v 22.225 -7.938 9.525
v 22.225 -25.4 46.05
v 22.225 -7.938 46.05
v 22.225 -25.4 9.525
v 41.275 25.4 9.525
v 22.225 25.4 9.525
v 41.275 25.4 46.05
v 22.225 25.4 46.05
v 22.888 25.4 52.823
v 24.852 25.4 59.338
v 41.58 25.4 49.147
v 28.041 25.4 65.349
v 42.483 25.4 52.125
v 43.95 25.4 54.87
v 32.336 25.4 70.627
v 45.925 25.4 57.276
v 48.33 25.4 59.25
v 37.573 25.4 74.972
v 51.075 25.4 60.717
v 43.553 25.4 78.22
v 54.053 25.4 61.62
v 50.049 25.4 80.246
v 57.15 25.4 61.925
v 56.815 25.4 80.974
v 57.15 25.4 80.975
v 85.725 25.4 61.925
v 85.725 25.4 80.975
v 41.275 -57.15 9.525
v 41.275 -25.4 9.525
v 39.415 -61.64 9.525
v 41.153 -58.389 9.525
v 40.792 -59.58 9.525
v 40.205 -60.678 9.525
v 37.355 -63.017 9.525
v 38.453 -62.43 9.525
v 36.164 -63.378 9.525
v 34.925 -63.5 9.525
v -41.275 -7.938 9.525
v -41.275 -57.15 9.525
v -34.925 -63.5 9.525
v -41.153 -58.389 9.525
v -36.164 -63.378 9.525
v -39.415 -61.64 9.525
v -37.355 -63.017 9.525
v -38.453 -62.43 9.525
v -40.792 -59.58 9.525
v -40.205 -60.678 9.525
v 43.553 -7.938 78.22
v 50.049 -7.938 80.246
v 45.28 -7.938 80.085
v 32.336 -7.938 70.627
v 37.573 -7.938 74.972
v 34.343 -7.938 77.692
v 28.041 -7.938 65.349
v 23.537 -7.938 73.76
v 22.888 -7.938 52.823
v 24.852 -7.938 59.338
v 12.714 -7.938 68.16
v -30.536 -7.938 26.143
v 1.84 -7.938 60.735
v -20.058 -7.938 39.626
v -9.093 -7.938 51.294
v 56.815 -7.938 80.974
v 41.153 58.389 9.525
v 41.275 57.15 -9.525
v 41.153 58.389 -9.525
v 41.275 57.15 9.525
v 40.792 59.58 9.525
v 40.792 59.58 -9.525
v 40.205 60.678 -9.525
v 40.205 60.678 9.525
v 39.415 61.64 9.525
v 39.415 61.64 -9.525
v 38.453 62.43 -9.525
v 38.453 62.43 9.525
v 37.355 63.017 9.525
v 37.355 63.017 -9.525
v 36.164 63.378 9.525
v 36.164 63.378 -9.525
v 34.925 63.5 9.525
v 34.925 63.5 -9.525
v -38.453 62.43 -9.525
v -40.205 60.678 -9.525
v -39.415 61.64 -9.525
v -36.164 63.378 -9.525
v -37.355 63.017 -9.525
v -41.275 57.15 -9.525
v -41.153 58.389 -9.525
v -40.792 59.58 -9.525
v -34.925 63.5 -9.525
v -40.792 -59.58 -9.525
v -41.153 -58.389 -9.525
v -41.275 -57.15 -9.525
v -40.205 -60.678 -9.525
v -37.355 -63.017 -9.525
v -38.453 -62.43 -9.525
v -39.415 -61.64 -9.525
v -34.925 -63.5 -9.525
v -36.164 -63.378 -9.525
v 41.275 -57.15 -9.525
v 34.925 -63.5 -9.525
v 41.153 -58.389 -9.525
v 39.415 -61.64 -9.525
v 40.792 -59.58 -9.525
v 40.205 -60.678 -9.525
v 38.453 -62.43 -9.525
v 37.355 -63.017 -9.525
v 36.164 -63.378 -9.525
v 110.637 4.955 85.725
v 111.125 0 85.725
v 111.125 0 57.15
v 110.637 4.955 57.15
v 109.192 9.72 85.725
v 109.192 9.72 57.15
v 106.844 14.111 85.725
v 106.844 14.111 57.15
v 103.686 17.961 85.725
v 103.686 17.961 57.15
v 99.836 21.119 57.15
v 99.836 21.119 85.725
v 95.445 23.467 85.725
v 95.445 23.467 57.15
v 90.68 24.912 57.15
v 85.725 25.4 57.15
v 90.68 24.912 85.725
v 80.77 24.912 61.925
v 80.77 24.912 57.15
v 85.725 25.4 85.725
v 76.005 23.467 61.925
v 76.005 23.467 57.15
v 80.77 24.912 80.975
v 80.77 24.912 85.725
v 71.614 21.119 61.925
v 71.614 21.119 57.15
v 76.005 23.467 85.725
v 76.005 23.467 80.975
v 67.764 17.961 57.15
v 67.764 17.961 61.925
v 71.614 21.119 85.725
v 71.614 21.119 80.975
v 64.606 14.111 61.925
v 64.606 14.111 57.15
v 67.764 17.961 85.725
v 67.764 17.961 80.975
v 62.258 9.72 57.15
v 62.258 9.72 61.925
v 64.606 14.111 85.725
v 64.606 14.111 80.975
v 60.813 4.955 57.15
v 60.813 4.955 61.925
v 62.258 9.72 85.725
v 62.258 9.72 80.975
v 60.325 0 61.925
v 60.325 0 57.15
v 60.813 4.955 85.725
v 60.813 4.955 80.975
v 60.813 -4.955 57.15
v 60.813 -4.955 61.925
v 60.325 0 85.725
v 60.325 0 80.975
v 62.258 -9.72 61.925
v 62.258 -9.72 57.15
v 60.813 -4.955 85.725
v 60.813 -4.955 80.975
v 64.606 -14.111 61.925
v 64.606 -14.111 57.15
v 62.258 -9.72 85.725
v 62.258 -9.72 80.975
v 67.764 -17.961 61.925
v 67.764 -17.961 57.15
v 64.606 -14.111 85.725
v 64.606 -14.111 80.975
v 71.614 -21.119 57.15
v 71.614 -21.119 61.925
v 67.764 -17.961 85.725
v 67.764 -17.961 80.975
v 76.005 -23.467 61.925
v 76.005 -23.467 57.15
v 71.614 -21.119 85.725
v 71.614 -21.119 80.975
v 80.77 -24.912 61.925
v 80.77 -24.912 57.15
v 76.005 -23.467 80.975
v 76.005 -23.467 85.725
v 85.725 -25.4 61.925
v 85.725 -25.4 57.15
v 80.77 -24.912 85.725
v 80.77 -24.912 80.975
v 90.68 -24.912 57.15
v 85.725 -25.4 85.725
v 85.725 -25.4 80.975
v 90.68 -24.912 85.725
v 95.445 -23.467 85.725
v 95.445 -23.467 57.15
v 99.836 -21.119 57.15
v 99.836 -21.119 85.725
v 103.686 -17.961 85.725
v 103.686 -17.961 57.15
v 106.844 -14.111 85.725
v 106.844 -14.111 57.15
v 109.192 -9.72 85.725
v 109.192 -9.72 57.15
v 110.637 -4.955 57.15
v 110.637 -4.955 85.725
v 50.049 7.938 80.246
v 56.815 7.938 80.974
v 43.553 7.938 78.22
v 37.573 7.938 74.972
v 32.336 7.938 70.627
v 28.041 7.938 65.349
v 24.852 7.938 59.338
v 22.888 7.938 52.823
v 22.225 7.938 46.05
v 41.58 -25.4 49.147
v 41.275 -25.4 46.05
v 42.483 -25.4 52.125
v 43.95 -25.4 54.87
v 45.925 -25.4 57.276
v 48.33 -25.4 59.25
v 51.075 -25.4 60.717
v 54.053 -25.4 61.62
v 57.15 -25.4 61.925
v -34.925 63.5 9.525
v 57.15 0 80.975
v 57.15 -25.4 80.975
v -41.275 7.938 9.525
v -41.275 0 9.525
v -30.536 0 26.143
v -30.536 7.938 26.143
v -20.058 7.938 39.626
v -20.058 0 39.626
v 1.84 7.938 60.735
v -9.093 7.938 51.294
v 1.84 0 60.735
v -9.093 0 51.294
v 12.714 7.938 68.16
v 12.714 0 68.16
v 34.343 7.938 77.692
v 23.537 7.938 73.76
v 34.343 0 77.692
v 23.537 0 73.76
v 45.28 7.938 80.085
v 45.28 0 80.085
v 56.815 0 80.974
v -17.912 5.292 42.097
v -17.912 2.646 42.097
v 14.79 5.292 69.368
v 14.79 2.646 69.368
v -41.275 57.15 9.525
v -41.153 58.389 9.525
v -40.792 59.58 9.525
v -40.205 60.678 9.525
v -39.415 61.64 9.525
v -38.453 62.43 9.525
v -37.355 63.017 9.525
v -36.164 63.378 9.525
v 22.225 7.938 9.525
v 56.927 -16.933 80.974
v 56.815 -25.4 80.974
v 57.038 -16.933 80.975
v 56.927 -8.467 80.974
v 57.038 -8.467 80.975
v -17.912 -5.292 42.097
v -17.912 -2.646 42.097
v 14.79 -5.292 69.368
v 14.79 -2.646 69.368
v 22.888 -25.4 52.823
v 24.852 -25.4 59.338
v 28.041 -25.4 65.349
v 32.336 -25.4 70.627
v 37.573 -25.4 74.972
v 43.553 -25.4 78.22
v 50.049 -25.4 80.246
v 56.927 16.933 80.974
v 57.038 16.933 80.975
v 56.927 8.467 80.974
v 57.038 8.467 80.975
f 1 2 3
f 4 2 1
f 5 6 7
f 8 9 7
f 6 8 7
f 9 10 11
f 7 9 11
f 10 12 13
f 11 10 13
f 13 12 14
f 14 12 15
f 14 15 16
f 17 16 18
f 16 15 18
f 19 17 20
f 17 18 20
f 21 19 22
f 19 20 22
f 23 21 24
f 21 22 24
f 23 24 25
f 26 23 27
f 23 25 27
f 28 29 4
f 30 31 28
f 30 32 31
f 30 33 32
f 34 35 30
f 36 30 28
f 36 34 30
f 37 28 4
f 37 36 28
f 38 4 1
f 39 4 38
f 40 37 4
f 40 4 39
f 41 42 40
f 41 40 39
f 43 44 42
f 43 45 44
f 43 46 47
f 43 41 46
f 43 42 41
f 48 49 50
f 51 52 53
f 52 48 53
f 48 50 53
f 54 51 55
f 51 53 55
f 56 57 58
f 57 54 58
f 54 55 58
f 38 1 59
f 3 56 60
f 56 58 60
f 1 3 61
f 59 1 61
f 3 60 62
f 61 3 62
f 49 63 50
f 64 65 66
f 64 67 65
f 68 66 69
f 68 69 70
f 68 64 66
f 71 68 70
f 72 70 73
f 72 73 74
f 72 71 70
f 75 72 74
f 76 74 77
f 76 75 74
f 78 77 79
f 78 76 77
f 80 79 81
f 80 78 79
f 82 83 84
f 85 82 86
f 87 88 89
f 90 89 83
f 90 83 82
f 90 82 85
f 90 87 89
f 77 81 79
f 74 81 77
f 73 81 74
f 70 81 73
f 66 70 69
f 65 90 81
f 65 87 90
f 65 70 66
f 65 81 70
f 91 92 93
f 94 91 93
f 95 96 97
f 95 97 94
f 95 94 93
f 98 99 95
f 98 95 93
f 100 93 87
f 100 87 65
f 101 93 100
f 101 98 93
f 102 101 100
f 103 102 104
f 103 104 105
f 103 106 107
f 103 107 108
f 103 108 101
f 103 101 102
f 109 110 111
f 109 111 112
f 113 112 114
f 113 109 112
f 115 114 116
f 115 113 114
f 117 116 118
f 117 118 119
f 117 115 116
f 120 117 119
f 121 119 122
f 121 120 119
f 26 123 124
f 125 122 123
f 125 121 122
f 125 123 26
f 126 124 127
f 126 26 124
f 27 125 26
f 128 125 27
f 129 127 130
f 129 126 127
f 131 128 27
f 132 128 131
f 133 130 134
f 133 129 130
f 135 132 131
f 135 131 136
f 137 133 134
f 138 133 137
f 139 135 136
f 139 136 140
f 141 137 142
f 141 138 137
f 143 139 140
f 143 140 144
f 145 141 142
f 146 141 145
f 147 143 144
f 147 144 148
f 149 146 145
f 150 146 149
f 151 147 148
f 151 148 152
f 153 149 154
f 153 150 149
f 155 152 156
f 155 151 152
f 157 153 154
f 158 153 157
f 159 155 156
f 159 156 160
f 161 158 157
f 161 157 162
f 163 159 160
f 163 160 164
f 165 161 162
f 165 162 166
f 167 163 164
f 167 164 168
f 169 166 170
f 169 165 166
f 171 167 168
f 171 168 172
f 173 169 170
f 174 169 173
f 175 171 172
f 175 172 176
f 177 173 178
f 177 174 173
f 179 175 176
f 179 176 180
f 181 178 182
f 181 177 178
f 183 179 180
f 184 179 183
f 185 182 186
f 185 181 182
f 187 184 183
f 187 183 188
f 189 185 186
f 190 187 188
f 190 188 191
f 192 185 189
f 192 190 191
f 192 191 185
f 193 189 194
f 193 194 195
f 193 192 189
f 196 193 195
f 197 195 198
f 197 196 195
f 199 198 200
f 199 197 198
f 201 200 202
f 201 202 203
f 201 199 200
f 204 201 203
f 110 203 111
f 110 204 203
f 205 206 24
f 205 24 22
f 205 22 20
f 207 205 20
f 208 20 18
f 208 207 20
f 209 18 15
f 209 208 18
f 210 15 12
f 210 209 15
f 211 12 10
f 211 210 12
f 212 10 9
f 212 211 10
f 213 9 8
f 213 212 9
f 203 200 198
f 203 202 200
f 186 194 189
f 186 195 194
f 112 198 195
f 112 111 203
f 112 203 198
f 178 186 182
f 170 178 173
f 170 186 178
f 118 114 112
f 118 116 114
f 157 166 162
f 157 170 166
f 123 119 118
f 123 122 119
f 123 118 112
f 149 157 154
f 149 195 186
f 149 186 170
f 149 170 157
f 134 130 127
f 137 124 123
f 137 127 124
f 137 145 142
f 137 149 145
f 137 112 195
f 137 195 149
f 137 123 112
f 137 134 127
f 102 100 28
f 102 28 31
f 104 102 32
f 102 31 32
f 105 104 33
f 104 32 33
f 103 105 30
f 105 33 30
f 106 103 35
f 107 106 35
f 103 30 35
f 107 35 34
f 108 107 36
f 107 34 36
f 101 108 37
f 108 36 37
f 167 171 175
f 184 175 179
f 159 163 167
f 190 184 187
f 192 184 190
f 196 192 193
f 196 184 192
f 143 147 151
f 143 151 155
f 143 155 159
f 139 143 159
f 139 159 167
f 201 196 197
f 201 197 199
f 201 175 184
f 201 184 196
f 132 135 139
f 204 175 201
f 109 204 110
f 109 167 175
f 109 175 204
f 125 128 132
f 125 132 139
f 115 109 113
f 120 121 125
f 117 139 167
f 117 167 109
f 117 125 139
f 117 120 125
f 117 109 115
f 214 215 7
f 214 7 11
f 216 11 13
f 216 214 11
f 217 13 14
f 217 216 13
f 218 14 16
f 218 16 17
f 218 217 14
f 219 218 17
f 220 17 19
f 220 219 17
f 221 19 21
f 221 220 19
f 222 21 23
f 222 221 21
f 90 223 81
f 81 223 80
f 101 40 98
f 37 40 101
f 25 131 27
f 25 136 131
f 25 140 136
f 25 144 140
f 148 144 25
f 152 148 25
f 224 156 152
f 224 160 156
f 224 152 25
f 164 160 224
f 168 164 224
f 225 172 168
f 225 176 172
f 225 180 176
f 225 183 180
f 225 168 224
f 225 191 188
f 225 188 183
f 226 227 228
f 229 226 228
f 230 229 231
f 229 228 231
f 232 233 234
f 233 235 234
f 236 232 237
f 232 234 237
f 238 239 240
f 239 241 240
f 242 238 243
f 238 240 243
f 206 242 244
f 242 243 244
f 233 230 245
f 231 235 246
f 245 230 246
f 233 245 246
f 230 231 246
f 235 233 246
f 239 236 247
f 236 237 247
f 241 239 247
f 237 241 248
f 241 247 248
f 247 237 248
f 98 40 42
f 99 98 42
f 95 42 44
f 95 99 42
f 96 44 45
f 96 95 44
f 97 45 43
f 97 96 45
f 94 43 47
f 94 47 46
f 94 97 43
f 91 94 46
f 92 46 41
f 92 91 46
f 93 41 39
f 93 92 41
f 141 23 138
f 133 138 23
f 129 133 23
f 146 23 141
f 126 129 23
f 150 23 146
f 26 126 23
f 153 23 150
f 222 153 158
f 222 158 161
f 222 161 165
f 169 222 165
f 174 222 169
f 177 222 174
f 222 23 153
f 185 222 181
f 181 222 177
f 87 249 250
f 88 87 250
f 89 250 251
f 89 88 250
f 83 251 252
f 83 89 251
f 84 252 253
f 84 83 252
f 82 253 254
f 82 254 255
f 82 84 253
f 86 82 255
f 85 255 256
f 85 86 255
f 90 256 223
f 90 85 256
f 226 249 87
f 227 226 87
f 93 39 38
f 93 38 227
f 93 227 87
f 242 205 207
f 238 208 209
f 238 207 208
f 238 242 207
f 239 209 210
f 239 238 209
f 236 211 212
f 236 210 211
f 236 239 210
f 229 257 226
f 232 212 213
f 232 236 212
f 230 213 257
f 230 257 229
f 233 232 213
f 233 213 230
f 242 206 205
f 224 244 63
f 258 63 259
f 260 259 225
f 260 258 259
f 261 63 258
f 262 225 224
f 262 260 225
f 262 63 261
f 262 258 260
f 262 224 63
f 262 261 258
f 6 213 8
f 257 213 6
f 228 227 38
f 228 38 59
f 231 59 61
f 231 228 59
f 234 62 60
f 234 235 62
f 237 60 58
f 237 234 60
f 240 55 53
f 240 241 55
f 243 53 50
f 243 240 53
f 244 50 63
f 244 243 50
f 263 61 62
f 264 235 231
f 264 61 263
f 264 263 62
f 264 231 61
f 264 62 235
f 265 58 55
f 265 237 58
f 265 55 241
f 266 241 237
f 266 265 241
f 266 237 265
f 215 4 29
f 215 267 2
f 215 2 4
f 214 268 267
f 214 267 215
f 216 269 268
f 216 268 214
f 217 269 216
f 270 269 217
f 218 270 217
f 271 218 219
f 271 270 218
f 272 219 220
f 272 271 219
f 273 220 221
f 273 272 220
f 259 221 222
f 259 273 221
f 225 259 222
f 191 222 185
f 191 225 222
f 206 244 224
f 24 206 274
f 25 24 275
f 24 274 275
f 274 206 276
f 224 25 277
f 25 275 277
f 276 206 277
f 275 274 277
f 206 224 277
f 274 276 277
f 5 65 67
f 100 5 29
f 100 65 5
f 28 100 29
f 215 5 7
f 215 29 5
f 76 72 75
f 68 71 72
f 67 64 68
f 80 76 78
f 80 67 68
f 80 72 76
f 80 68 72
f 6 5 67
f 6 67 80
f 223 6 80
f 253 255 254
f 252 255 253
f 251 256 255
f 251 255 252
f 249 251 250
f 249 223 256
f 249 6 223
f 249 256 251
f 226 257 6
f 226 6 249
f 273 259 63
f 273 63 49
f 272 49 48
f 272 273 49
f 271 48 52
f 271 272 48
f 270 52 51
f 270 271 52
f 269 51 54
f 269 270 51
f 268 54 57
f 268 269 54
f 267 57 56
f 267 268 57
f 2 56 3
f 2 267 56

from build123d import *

# Parameters (mm, degrees)
F1_DEPTH = 63.5
F2_DEPTH = 25.4
F3_DEPTH = 7.9375
F5_R     = 6.35


with BuildPart() as f1:
    # F0 (on Front) → F1 (new body, symmetric)
    with BuildSketch(Plane.XZ):
        Polygon((-41.275, 9.525), (-41.275, -9.525), (41.275, -9.525), (41.275, 9.525), (22.225, 9.525), align=None)
    extrude(amount=F1_DEPTH, both=True)

    # F0 (on Front) → F2 (join, symmetric)
    with BuildSketch(Plane.XZ):
        with BuildLine():
            Line((22.225, 9.525), (41.275, 9.525))
            Line((41.275, 9.525), (41.275, 46.0502))
            ThreePointArc((41.275, 46.0502), (45.92468, 57.27552), (57.15, 61.9252))
            Line((57.15, 61.9252), (60.325, 61.9252))
            Line((60.325, 61.9252), (60.325, 80.9752))
            Line((60.325, 80.9752), (57.15, 80.9752))
            add(Edge.make_bspline(
                [(56.815137, 80.973595), (56.926678, 80.974353), (57.038299, 80.974888), (57.15, 80.9752)],
                knots=[121.334974, 121.334974, 121.334974, 121.334974, 121.624881, 121.624881, 121.624881, 121.624881], degree=3))
            ThreePointArc((56.815137, 80.973595), (32.336186, 70.627227), (22.225, 46.0502))
            Line((22.225, 46.0502), (22.225, 9.525))
        make_face()
        Polygon((85.725, 80.9752), (60.325, 80.9752), (60.325, 61.9252), (71.4375, 61.9252), (85.725, 61.9252), align=None)
    extrude(amount=F2_DEPTH, both=True)

    # F0 (on Front) → F3 (join, symmetric)
    with BuildSketch(Plane.XZ):
        with BuildLine():
            add(Edge.make_bspline(
                [(-41.275, 9.525), (-22.584794, 41.291515), (10.131669, 80.656242), (56.815137, 80.973595)],
                knots=[0, 0, 0, 0, 121.334974, 121.334974, 121.334974, 121.334974], degree=3))
            Line((-41.275, 9.525), (22.225, 9.525))
            Line((22.225, 9.525), (22.225, 46.0502))
            ThreePointArc((22.225, 46.0502), (32.336186, 70.627227), (56.815137, 80.973595))
        make_face()
    extrude(amount=F3_DEPTH, both=True)

    # F0 (on Front) → F4 (revolve)
    with BuildSketch(Plane.XZ):
        Polygon((85.725, 85.725), (85.725, 80.9752), (85.725, 61.9252), (85.725, 57.15), (111.125, 57.15), (111.125, 85.725), align=None)
    revolve(axis=Axis((85.725, 0, 71.4375), (0, 0, 1)))

    # F5
    f5_edges = [f1.edges().sort_by_distance(p)[0] for p in [
        (-41.275, -63.5, 0),
        (41.275, -63.5, 0),
        (41.275, 63.5, 0),
        (-41.275, 63.5, 0),
    ]]
    fillet(f5_edges, radius=F5_R)


solid = f1.part
